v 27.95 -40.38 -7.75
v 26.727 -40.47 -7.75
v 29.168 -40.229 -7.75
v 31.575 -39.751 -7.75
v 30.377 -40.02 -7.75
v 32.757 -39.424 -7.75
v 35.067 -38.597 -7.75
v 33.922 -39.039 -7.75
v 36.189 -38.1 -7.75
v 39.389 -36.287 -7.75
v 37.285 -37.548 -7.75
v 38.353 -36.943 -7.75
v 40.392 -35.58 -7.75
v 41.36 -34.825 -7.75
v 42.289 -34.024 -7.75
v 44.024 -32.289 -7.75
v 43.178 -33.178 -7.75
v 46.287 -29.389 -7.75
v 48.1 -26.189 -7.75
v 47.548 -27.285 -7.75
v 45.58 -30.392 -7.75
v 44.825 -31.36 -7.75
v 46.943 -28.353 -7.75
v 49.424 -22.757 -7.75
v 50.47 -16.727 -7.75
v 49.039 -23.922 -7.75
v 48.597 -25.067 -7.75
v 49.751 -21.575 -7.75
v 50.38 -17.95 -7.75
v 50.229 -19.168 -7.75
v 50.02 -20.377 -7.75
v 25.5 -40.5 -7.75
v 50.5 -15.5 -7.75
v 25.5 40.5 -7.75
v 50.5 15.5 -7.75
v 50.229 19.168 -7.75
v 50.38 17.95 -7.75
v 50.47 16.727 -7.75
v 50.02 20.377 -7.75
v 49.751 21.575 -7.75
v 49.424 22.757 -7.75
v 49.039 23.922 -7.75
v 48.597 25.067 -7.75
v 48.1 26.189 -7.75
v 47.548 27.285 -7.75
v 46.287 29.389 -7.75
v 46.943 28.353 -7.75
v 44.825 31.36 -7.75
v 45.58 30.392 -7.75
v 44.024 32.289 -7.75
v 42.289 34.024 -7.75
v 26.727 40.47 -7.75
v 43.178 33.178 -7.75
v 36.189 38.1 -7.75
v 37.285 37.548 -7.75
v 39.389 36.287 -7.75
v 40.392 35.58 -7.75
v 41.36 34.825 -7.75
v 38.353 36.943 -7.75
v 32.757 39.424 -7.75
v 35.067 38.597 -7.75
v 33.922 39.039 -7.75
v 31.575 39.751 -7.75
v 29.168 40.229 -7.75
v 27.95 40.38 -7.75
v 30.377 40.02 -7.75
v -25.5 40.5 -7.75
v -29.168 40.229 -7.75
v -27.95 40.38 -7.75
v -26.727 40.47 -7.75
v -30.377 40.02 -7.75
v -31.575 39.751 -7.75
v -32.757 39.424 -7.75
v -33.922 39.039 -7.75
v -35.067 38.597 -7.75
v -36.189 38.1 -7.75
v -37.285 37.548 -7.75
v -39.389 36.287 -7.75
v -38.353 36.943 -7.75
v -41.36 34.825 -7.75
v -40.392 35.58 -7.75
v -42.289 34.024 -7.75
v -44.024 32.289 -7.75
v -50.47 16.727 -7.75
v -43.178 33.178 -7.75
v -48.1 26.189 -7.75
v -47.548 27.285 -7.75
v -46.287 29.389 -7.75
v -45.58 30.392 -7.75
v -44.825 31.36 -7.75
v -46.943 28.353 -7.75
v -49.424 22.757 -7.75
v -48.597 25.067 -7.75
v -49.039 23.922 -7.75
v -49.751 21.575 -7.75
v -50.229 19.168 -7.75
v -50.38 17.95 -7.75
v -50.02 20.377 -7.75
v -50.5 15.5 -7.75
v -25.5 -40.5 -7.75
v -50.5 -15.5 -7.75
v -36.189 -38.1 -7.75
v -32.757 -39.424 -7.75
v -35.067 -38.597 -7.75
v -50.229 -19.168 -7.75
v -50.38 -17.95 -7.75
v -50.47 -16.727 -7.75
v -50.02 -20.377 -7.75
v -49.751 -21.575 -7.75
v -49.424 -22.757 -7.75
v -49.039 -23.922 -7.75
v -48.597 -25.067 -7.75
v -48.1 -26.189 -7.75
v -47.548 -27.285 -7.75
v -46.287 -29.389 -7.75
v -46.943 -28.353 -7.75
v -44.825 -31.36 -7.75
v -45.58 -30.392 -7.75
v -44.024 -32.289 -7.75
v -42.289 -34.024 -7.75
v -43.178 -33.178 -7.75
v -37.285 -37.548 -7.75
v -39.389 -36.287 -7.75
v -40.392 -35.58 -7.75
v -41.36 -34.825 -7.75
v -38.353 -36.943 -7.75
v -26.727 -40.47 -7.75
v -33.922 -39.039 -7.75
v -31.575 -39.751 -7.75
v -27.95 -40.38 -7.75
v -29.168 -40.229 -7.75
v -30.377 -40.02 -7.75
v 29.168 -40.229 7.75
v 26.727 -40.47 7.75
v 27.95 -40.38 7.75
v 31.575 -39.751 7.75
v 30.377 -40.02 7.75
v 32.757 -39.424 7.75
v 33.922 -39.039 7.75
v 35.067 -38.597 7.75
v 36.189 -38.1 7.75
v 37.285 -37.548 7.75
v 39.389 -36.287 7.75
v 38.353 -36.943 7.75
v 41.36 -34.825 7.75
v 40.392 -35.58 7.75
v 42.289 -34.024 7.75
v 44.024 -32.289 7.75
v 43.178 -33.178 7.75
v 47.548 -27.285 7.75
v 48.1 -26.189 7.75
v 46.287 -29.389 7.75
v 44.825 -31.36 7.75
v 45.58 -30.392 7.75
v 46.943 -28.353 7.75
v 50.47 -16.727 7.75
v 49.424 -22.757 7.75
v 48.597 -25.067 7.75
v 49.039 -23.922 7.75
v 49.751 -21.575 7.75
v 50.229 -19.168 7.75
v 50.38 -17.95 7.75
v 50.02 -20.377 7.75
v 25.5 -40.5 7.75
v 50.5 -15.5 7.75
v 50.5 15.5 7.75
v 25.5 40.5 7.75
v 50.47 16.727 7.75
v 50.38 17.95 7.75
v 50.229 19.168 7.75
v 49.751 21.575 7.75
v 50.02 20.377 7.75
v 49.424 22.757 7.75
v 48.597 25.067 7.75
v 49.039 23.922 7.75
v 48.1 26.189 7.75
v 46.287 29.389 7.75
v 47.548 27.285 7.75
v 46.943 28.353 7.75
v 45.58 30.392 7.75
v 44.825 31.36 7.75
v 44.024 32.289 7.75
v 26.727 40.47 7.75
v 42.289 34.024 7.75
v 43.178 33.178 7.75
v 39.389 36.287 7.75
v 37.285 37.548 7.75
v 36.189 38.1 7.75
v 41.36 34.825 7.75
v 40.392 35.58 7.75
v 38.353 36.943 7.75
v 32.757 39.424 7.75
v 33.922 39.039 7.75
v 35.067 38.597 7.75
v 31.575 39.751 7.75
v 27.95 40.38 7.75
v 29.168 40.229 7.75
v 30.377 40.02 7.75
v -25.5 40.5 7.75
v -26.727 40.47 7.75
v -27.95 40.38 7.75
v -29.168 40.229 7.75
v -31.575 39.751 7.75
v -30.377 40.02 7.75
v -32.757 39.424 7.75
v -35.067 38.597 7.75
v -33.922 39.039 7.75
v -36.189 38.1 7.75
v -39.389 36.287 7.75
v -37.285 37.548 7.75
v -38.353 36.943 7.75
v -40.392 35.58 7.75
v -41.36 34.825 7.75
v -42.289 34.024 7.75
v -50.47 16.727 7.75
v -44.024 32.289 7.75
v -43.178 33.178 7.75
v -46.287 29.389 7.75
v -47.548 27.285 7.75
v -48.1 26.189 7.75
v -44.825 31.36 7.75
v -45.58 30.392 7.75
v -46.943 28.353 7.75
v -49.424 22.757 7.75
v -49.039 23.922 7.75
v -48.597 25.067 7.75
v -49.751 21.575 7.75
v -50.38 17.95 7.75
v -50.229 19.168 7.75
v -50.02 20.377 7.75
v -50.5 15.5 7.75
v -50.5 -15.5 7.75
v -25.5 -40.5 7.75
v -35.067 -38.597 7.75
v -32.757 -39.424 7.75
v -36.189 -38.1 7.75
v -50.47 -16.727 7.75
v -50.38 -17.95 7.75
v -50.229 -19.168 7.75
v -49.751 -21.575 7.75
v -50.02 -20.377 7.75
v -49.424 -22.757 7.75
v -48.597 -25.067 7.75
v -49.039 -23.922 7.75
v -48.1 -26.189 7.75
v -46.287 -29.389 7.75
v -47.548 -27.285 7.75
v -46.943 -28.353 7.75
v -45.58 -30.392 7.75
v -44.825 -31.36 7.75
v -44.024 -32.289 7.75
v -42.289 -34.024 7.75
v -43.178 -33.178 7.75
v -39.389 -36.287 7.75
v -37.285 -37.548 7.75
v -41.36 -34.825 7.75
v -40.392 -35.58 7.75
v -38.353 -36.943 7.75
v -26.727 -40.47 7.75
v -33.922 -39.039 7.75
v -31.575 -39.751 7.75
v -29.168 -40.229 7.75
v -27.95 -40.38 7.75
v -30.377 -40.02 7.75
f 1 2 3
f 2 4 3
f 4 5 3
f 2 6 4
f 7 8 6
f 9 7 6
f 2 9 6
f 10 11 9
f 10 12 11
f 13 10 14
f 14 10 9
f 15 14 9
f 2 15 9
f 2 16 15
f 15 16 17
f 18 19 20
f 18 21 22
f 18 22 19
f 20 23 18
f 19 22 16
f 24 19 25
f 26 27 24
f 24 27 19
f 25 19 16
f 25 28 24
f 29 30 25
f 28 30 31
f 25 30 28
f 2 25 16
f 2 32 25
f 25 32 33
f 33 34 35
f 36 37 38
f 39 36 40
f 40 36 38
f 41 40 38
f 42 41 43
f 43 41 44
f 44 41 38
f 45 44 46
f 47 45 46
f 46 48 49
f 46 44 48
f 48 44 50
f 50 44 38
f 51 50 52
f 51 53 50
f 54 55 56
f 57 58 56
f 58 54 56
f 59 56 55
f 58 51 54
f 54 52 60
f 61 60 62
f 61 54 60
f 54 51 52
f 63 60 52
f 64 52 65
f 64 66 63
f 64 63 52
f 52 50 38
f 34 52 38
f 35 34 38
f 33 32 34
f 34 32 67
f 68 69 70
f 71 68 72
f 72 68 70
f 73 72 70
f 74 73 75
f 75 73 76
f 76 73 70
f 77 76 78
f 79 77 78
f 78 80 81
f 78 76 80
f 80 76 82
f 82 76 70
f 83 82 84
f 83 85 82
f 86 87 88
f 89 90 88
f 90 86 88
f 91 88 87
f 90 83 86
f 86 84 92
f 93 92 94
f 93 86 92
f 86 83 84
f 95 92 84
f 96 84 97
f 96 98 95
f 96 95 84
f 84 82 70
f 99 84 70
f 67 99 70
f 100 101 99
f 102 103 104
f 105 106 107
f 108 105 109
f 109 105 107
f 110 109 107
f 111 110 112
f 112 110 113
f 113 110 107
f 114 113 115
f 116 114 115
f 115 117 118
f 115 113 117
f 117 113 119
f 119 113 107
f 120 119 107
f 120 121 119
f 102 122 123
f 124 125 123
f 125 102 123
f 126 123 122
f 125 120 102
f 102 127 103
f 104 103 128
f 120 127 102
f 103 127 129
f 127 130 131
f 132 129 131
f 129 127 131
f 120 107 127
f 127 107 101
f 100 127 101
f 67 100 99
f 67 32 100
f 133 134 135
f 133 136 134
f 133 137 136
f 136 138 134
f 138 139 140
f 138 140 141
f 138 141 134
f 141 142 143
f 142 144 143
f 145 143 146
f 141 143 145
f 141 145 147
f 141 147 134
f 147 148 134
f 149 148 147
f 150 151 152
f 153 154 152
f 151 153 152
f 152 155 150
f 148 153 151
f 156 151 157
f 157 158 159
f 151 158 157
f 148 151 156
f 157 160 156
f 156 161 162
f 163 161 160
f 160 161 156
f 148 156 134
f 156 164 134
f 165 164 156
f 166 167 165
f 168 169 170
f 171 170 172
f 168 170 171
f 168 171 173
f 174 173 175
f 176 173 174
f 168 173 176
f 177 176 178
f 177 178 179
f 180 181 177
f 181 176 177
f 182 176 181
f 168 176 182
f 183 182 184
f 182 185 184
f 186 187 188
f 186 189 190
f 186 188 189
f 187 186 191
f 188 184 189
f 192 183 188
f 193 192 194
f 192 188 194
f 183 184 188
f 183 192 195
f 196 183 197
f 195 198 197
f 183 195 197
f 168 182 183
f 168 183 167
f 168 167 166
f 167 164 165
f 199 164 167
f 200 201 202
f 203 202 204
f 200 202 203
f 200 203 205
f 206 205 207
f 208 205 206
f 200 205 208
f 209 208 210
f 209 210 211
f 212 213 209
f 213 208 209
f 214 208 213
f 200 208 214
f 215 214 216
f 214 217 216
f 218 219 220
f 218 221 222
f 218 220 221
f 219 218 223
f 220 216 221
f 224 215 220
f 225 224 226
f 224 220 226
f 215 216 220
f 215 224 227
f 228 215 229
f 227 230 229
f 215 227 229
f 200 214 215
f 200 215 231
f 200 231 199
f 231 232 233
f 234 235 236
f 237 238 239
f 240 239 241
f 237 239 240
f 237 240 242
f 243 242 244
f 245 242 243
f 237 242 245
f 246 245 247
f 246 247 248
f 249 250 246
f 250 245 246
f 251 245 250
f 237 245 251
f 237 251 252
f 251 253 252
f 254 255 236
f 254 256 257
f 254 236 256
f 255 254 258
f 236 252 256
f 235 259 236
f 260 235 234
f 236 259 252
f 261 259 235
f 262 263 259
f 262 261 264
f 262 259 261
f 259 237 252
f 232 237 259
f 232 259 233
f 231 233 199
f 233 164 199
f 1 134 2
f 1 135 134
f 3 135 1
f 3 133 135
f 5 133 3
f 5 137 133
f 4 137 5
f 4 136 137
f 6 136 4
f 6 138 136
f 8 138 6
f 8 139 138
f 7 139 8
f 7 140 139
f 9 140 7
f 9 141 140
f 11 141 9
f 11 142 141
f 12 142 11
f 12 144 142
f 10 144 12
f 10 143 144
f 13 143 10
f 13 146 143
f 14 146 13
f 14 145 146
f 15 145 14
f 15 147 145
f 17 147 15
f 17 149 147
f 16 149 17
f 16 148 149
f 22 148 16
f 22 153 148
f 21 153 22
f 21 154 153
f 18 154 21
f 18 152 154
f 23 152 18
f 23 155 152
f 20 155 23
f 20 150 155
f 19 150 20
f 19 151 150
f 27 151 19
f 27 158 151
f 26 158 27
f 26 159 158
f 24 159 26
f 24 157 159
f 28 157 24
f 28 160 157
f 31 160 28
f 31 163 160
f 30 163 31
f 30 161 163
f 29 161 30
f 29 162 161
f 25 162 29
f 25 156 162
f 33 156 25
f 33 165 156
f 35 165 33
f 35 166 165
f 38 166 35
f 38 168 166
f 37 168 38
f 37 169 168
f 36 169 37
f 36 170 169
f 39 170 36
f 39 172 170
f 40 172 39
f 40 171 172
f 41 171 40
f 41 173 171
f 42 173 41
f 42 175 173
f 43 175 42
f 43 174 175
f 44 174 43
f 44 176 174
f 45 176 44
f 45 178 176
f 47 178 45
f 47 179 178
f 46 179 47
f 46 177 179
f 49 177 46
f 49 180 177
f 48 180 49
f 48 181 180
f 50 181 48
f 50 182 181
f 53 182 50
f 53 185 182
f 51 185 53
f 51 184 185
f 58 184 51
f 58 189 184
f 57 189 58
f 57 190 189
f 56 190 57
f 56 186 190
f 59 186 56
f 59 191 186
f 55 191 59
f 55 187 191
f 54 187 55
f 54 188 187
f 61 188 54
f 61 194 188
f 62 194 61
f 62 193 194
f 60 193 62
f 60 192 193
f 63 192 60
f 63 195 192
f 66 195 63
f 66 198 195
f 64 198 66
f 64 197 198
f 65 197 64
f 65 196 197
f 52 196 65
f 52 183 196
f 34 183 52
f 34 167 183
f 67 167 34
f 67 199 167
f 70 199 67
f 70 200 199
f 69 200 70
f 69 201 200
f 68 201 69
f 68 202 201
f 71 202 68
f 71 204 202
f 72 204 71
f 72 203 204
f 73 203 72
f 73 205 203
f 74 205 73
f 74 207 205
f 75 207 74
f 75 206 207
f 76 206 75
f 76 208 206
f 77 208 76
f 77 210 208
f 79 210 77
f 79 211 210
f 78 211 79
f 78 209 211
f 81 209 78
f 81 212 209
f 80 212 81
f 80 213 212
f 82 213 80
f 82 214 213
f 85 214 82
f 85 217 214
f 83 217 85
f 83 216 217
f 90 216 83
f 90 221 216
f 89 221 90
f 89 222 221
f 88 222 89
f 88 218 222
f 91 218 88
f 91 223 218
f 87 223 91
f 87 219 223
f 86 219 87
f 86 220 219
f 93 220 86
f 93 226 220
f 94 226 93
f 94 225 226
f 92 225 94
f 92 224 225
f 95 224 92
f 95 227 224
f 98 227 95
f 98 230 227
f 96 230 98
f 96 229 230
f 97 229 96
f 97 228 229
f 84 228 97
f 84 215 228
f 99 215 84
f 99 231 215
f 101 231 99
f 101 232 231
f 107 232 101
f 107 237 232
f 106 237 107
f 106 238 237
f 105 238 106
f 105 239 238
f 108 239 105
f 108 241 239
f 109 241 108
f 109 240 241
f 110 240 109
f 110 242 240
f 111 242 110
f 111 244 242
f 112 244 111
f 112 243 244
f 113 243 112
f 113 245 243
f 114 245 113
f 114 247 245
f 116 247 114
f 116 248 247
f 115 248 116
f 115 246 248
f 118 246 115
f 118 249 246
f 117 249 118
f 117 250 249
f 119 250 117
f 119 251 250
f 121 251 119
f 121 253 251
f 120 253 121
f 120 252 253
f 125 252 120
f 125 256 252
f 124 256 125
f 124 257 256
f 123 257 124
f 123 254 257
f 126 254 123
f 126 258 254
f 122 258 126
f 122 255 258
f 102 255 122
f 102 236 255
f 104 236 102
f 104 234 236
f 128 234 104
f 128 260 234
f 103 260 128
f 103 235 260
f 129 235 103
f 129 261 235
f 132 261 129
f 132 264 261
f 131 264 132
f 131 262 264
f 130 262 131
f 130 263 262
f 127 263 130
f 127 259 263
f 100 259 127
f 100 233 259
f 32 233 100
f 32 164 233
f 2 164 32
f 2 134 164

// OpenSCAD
// ============================================================
// 奥克斯(AUX)饮水机杯垫 —— 实心版
// 尺寸: 101 x 81 x 15.5 mm
// 四个竖边圆角 R = 25 (顶面、底面保持平面)
// 顶/底棱边 45° 倒角(默认 2mm, 设为 0 可取消)
// ============================================================

$fn = 128;

W = 101;        // 长 (X)
D = 81;         // 宽 (Y)
H = 15.5;       // 高 (Z)
R = 25;         // 竖边圆角半径

CHAMFER = 0;    // 顶/底棱边倒角尺寸 (0 = 不倒角)
E = 0.02;       // 微小过切, 避免与顶/底面共面

// ------------------------------------------------------------
// 带圆角的矩形截面(四角 R25)
// 思路: 先向内收缩 R, 再向外扩张 R,
//       直角被"削"成半径 R 的圆弧, 直边位置不变。
// ------------------------------------------------------------
module profile() {
    offset(r = R) offset(r = -R)
        square([W, D], center = true);
}

// 主体: 截面沿 Z 拉伸 -> 竖边自然带 R25 圆角, 顶/底是平面
module body() {
    linear_extrude(height = H, center = true)
        profile();
}

// ------------------------------------------------------------
// 45° 倒角楔块: 截面是直角三角形, 位于某一侧面, 沿另一水平轴拉伸。
// axis: "X" 或 "Y" —— 截面所在侧面;  sign: +1 / -1 侧面方向
// top : true 顶部棱边 / false 底部棱边
// 多边形坐标: (第一维 = 拉伸方向坐标, 第二维 = 世界 Z)
// ------------------------------------------------------------
module wedge(axis, sign, top) {
    if (axis == "Y") {
        // 截面在 YZ 平面, 沿 X 拉伸: rotate([0,90,0]) 下
        // 世界坐标 = (0, 多边形Y, -多边形X)
        rotate([0, 90, 0])
            linear_extrude(W + 4 * CHAMFER, center = true)
                polygon(top ? [
                    [-H/2 - E,            sign * (D/2 - CHAMFER)],
                    [-H/2 + CHAMFER + E,  sign *  D/2],
                    [-H/2 - E,            sign *  D/2]
                ] : [
                    [ H/2 + E,            sign * (D/2 - CHAMFER)],
                    [ H/2 - CHAMFER - E,  sign *  D/2],
                    [ H/2 + E,            sign *  D/2]
                ]);
    } else {
        // 截面在 XZ 平面, 沿 Y 拉伸: rotate([90,0,0]) 下
        // 世界坐标 = (多边形X, 0, 多边形Y)
        rotate([90, 0, 0])
            linear_extrude(D + 4 * CHAMFER, center = true)
                polygon(top ? [
                    [sign * (W/2 - CHAMFER),  H/2 + E],
                    [sign *  W/2,             H/2 - CHAMFER - E],
                    [sign *  W/2,             H/2 + E]
                ] : [
                    [sign * (W/2 - CHAMFER), -H/2 - E],
                    [sign *  W/2,            -H/2 + CHAMFER + E],
                    [sign *  W/2,            -H/2 - E]
                ]);
    }
}

// 成品: 主体减去四边顶部 + 四边底部的倒角楔块
module coaster() {
    if (CHAMFER <= 0) {
        body();
    } else {
        difference() {
            body();
            for (s = [1, -1]) {
                wedge("Y", s, true);   wedge("Y", s, false);
                wedge("X", s, true);   wedge("X", s, false);
            }
        }
    }
}

coaster();
